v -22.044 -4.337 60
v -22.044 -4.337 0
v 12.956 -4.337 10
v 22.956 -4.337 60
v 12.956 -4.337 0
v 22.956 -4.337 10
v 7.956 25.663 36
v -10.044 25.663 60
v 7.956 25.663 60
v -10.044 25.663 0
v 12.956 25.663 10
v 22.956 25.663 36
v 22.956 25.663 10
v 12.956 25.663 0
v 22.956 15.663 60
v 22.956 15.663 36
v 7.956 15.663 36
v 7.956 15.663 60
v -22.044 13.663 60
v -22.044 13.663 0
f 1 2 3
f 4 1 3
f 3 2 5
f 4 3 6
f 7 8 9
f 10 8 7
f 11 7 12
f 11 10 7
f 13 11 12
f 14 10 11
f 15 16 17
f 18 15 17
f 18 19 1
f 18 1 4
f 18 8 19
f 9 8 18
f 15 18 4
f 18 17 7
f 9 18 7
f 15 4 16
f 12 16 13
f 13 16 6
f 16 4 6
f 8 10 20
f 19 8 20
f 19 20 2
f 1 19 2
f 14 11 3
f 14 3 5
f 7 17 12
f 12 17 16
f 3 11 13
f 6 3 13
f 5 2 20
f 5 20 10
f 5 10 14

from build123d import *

# Parameters (mm, degrees)
BOSS_EXTRUDE1_DEPTH = 60
SKETCH3_W           = 15
SKETCH3_H           = 36
BOSS_EXTRUDE2_DEPTH = 10
SKETCH4_W           = 10
SKETCH4_H           = 10
CUT_EXTRUDE2_DEPTH  = 40


with BuildPart() as part:
    # Sketch1 → Boss-Extrude1 (new body)
    with BuildSketch(Plane.XY):
        Polygon((-22.044198895, 13.662983425), (-22.044198895, -4.337016575), (22.955801105, -4.337016575), (22.955801105, 15.662983425), (7.955801105, 15.662983425), (7.955801105, 25.662983425), (-10.044198895, 25.662983425), align=None)
    extrude(amount=BOSS_EXTRUDE1_DEPTH)

    # Sketch3 → Boss-Extrude2 (add)
    with BuildSketch(Plane(origin=(0, 15.662983425, 0), x_dir=(1, 0, 0), z_dir=(0, 1, 0))):
        with Locations((15.455801105, -18)):
            Rectangle(SKETCH3_W, SKETCH3_H)
    extrude(amount=BOSS_EXTRUDE2_DEPTH)

    # Sketch4 → Cut-Extrude2 (cut)
    with BuildSketch(Plane(origin=(0, 25.662983425, 0), x_dir=(1, 0, 0), z_dir=(0, 1, 0))):
        with Locations((17.955801105, -5)):
            Rectangle(SKETCH4_W, SKETCH4_H)
    extrude(amount=-CUT_EXTRUDE2_DEPTH, mode=Mode.SUBTRACT)


solid = part.part
